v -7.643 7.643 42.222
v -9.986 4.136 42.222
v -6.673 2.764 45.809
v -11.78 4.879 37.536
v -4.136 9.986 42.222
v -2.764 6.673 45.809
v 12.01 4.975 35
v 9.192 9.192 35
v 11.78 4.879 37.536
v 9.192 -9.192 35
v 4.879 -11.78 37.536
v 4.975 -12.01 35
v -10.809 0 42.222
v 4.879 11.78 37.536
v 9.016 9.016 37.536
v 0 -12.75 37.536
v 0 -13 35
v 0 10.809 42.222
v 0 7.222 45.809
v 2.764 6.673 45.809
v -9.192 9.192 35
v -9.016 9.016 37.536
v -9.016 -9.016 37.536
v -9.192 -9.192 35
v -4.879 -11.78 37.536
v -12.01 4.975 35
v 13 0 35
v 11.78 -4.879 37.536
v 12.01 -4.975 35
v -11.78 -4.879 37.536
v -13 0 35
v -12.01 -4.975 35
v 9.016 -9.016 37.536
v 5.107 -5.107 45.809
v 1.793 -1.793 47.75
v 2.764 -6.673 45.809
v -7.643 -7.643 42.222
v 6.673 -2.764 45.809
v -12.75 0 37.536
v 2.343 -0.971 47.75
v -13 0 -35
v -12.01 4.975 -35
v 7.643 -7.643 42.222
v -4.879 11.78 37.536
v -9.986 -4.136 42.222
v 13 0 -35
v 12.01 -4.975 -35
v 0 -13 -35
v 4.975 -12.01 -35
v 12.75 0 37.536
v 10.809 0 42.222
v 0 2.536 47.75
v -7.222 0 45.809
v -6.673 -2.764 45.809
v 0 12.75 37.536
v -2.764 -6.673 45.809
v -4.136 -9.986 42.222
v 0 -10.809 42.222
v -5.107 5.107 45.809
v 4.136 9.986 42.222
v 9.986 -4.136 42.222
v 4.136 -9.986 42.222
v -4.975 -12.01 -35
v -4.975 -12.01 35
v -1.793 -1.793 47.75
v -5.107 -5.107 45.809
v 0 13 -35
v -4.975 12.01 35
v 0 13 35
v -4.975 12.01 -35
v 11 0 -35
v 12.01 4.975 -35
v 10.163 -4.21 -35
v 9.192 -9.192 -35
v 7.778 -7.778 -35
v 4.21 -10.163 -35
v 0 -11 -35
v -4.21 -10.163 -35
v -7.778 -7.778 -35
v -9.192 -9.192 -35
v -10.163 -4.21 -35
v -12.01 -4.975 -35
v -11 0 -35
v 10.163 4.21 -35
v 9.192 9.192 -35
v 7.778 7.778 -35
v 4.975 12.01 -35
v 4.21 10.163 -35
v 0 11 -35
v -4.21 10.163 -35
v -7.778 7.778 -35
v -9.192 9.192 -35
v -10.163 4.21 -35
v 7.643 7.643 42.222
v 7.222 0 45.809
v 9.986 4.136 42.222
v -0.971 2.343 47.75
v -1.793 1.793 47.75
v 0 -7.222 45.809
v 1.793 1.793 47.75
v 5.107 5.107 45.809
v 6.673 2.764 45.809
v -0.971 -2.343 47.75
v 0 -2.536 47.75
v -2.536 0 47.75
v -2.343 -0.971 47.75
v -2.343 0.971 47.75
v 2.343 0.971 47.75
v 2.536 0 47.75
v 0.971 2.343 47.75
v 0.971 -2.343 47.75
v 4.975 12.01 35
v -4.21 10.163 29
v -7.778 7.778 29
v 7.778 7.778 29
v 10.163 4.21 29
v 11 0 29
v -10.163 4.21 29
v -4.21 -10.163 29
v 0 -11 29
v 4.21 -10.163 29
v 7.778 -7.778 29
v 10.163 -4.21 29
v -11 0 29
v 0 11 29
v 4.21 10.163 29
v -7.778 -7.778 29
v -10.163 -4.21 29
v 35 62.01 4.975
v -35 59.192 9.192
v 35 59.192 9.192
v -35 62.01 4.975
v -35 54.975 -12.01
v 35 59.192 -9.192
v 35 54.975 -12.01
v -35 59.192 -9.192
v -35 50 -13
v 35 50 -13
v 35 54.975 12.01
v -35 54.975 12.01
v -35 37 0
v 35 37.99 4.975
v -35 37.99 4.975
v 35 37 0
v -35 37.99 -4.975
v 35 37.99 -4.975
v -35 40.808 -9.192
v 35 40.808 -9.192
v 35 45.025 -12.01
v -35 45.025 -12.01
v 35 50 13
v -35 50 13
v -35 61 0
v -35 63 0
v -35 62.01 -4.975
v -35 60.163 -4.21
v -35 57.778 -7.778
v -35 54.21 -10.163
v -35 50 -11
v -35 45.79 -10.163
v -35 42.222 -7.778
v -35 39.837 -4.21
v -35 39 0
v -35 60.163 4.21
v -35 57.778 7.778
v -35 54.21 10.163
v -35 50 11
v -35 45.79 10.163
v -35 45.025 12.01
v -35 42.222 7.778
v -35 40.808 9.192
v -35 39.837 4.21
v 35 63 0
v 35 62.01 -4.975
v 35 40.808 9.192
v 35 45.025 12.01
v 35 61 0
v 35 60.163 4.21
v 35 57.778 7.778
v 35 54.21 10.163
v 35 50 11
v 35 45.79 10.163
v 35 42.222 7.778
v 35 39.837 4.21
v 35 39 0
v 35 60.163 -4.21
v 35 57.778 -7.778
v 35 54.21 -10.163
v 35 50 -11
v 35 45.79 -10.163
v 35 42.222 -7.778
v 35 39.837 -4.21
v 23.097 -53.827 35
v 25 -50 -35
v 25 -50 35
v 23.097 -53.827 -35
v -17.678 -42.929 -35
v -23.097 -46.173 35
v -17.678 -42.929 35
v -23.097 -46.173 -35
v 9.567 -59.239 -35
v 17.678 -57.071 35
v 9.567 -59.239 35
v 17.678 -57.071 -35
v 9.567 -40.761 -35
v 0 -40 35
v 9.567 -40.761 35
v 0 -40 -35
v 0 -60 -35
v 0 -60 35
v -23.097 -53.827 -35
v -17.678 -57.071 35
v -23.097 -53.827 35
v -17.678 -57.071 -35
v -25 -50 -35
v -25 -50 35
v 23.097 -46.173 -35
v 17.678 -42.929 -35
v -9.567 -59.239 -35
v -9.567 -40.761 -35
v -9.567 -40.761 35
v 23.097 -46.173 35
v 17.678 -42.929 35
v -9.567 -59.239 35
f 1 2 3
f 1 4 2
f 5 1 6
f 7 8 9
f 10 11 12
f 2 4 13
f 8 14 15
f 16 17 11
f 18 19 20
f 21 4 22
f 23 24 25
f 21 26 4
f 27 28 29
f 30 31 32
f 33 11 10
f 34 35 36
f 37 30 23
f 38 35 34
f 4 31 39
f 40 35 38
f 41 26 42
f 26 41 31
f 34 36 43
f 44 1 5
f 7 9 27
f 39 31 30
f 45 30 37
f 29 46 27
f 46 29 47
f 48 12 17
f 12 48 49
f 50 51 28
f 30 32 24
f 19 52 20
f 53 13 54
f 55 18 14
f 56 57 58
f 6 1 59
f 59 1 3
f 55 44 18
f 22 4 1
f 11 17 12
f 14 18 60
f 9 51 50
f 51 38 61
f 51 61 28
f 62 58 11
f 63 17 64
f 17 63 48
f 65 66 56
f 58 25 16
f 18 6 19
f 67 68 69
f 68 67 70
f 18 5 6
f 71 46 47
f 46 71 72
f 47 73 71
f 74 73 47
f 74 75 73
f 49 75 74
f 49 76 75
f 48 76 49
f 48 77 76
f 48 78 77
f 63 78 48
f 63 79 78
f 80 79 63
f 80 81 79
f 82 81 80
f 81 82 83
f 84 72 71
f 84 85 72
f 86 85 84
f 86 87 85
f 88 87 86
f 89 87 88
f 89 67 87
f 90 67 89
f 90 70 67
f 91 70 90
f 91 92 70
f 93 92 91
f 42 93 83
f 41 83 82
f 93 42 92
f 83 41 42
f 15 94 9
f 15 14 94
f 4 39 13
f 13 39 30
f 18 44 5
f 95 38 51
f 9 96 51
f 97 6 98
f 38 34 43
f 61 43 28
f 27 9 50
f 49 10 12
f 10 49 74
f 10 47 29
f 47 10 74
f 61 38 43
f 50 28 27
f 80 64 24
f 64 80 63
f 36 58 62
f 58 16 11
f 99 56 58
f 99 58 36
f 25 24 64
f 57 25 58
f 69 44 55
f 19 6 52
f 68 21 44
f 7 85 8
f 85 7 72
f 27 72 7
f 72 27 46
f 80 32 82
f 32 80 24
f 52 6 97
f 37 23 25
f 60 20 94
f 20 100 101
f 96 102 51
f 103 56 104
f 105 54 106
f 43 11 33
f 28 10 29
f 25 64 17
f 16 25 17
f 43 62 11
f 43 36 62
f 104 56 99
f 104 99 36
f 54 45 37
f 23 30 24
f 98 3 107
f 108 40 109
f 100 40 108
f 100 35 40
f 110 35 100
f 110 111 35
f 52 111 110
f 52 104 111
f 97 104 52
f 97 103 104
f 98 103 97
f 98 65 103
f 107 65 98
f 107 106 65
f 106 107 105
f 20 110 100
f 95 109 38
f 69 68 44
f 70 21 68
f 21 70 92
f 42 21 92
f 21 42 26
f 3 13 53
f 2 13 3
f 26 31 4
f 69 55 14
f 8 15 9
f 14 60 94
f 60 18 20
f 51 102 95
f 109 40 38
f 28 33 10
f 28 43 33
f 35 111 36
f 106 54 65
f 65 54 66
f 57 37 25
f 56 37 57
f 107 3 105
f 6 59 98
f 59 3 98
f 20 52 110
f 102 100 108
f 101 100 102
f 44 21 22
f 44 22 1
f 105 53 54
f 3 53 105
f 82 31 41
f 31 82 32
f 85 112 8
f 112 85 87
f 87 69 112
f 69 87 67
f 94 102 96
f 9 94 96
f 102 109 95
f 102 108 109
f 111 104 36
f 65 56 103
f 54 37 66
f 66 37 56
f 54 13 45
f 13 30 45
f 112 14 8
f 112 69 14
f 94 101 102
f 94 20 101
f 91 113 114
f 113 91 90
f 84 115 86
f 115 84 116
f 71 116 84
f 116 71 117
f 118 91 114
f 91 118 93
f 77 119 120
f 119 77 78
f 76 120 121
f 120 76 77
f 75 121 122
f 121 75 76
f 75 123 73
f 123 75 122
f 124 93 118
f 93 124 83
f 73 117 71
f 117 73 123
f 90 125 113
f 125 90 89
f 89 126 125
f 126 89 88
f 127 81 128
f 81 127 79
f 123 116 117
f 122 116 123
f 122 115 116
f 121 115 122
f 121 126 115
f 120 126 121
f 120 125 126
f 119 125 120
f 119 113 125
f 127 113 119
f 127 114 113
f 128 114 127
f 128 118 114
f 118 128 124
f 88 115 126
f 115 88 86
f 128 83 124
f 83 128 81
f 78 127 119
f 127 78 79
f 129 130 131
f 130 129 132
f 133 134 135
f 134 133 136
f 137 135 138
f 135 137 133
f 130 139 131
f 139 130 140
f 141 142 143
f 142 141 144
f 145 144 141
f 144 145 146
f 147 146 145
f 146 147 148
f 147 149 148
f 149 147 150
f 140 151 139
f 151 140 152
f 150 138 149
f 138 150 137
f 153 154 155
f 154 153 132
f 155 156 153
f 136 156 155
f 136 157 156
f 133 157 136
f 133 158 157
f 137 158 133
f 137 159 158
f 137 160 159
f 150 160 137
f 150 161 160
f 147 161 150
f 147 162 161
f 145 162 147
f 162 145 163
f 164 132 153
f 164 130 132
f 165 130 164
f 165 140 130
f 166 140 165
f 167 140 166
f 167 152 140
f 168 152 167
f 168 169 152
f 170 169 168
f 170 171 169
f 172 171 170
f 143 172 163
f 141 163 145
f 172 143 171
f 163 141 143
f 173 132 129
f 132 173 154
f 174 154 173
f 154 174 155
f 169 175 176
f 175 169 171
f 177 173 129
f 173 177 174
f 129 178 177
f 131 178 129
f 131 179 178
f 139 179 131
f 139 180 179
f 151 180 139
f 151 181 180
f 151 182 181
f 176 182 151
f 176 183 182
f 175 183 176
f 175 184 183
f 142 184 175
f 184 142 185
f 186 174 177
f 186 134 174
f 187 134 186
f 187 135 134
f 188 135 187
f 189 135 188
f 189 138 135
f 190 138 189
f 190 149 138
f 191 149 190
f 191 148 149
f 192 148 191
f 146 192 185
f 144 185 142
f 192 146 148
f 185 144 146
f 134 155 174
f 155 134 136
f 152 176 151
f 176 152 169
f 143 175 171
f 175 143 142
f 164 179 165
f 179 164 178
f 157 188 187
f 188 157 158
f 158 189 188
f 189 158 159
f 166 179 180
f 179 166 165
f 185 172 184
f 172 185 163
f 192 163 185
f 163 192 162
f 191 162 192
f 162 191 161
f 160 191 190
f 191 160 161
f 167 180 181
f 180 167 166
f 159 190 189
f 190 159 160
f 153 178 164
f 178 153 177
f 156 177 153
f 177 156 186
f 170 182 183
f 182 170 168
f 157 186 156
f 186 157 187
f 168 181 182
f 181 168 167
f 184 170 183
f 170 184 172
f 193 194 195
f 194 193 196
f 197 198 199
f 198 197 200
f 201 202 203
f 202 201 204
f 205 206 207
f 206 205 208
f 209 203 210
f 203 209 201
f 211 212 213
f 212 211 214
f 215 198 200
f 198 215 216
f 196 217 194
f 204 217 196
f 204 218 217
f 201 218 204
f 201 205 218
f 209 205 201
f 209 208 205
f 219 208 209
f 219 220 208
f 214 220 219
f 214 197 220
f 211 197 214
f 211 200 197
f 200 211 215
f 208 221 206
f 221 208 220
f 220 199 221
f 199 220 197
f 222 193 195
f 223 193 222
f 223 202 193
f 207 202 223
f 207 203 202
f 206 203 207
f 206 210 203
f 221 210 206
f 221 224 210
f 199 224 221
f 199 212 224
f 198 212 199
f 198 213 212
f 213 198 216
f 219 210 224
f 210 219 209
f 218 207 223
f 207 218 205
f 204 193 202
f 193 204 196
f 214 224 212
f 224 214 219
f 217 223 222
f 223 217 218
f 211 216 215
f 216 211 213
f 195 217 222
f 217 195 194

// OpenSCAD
 poly_n = 16;
 diametro = 22;
 radio= diametro/2;
 grosor= 4;
 altura =70;
 
 
 //color("#aa0000")cylinder(h = altura, d=diametro, center = true, $fn=poly_n);
 // translate([0, 10, 0.0])
 difference(){
    hull(){
    translate([0, 0, altura/2])//punta centrada
    sphere( d=diametro+grosor, $fn=poly_n);
    cylinder(h = altura, d=diametro+grosor, center = true, $fn=poly_n);
     }
    translate([0, 0, -grosor])
    cylinder(h = altura-grosor, d=diametro, center = true, $fn=poly_n);
 }

translate([0, 50,0])
rotate([0,90,0])
  difference(){
    cylinder(h = altura, d=diametro+grosor, center = true, $fn=poly_n);
    cylinder(h = altura, d=diametro, center = true, $fn=poly_n);
 }
translate([0, -50,0])

linear_extrude(height=altura,center=true)//,twist=90
    scale([5,2,10])
    circle(d=10);
//  cylinder(h=altura,d1=diametro,d2=altura
// translate([0, -50,0])
//
// module rounded_car_body(length=80, rear_height=20, rear_width=25, scaling_factor=0.5) {
//rotate([0,-90,0])
//    linear_extrude(height=length,center=true,scale=scaling_factor)
//    resize([rear_height,rear_width])
//    circle(d=rear_height);    
//}
